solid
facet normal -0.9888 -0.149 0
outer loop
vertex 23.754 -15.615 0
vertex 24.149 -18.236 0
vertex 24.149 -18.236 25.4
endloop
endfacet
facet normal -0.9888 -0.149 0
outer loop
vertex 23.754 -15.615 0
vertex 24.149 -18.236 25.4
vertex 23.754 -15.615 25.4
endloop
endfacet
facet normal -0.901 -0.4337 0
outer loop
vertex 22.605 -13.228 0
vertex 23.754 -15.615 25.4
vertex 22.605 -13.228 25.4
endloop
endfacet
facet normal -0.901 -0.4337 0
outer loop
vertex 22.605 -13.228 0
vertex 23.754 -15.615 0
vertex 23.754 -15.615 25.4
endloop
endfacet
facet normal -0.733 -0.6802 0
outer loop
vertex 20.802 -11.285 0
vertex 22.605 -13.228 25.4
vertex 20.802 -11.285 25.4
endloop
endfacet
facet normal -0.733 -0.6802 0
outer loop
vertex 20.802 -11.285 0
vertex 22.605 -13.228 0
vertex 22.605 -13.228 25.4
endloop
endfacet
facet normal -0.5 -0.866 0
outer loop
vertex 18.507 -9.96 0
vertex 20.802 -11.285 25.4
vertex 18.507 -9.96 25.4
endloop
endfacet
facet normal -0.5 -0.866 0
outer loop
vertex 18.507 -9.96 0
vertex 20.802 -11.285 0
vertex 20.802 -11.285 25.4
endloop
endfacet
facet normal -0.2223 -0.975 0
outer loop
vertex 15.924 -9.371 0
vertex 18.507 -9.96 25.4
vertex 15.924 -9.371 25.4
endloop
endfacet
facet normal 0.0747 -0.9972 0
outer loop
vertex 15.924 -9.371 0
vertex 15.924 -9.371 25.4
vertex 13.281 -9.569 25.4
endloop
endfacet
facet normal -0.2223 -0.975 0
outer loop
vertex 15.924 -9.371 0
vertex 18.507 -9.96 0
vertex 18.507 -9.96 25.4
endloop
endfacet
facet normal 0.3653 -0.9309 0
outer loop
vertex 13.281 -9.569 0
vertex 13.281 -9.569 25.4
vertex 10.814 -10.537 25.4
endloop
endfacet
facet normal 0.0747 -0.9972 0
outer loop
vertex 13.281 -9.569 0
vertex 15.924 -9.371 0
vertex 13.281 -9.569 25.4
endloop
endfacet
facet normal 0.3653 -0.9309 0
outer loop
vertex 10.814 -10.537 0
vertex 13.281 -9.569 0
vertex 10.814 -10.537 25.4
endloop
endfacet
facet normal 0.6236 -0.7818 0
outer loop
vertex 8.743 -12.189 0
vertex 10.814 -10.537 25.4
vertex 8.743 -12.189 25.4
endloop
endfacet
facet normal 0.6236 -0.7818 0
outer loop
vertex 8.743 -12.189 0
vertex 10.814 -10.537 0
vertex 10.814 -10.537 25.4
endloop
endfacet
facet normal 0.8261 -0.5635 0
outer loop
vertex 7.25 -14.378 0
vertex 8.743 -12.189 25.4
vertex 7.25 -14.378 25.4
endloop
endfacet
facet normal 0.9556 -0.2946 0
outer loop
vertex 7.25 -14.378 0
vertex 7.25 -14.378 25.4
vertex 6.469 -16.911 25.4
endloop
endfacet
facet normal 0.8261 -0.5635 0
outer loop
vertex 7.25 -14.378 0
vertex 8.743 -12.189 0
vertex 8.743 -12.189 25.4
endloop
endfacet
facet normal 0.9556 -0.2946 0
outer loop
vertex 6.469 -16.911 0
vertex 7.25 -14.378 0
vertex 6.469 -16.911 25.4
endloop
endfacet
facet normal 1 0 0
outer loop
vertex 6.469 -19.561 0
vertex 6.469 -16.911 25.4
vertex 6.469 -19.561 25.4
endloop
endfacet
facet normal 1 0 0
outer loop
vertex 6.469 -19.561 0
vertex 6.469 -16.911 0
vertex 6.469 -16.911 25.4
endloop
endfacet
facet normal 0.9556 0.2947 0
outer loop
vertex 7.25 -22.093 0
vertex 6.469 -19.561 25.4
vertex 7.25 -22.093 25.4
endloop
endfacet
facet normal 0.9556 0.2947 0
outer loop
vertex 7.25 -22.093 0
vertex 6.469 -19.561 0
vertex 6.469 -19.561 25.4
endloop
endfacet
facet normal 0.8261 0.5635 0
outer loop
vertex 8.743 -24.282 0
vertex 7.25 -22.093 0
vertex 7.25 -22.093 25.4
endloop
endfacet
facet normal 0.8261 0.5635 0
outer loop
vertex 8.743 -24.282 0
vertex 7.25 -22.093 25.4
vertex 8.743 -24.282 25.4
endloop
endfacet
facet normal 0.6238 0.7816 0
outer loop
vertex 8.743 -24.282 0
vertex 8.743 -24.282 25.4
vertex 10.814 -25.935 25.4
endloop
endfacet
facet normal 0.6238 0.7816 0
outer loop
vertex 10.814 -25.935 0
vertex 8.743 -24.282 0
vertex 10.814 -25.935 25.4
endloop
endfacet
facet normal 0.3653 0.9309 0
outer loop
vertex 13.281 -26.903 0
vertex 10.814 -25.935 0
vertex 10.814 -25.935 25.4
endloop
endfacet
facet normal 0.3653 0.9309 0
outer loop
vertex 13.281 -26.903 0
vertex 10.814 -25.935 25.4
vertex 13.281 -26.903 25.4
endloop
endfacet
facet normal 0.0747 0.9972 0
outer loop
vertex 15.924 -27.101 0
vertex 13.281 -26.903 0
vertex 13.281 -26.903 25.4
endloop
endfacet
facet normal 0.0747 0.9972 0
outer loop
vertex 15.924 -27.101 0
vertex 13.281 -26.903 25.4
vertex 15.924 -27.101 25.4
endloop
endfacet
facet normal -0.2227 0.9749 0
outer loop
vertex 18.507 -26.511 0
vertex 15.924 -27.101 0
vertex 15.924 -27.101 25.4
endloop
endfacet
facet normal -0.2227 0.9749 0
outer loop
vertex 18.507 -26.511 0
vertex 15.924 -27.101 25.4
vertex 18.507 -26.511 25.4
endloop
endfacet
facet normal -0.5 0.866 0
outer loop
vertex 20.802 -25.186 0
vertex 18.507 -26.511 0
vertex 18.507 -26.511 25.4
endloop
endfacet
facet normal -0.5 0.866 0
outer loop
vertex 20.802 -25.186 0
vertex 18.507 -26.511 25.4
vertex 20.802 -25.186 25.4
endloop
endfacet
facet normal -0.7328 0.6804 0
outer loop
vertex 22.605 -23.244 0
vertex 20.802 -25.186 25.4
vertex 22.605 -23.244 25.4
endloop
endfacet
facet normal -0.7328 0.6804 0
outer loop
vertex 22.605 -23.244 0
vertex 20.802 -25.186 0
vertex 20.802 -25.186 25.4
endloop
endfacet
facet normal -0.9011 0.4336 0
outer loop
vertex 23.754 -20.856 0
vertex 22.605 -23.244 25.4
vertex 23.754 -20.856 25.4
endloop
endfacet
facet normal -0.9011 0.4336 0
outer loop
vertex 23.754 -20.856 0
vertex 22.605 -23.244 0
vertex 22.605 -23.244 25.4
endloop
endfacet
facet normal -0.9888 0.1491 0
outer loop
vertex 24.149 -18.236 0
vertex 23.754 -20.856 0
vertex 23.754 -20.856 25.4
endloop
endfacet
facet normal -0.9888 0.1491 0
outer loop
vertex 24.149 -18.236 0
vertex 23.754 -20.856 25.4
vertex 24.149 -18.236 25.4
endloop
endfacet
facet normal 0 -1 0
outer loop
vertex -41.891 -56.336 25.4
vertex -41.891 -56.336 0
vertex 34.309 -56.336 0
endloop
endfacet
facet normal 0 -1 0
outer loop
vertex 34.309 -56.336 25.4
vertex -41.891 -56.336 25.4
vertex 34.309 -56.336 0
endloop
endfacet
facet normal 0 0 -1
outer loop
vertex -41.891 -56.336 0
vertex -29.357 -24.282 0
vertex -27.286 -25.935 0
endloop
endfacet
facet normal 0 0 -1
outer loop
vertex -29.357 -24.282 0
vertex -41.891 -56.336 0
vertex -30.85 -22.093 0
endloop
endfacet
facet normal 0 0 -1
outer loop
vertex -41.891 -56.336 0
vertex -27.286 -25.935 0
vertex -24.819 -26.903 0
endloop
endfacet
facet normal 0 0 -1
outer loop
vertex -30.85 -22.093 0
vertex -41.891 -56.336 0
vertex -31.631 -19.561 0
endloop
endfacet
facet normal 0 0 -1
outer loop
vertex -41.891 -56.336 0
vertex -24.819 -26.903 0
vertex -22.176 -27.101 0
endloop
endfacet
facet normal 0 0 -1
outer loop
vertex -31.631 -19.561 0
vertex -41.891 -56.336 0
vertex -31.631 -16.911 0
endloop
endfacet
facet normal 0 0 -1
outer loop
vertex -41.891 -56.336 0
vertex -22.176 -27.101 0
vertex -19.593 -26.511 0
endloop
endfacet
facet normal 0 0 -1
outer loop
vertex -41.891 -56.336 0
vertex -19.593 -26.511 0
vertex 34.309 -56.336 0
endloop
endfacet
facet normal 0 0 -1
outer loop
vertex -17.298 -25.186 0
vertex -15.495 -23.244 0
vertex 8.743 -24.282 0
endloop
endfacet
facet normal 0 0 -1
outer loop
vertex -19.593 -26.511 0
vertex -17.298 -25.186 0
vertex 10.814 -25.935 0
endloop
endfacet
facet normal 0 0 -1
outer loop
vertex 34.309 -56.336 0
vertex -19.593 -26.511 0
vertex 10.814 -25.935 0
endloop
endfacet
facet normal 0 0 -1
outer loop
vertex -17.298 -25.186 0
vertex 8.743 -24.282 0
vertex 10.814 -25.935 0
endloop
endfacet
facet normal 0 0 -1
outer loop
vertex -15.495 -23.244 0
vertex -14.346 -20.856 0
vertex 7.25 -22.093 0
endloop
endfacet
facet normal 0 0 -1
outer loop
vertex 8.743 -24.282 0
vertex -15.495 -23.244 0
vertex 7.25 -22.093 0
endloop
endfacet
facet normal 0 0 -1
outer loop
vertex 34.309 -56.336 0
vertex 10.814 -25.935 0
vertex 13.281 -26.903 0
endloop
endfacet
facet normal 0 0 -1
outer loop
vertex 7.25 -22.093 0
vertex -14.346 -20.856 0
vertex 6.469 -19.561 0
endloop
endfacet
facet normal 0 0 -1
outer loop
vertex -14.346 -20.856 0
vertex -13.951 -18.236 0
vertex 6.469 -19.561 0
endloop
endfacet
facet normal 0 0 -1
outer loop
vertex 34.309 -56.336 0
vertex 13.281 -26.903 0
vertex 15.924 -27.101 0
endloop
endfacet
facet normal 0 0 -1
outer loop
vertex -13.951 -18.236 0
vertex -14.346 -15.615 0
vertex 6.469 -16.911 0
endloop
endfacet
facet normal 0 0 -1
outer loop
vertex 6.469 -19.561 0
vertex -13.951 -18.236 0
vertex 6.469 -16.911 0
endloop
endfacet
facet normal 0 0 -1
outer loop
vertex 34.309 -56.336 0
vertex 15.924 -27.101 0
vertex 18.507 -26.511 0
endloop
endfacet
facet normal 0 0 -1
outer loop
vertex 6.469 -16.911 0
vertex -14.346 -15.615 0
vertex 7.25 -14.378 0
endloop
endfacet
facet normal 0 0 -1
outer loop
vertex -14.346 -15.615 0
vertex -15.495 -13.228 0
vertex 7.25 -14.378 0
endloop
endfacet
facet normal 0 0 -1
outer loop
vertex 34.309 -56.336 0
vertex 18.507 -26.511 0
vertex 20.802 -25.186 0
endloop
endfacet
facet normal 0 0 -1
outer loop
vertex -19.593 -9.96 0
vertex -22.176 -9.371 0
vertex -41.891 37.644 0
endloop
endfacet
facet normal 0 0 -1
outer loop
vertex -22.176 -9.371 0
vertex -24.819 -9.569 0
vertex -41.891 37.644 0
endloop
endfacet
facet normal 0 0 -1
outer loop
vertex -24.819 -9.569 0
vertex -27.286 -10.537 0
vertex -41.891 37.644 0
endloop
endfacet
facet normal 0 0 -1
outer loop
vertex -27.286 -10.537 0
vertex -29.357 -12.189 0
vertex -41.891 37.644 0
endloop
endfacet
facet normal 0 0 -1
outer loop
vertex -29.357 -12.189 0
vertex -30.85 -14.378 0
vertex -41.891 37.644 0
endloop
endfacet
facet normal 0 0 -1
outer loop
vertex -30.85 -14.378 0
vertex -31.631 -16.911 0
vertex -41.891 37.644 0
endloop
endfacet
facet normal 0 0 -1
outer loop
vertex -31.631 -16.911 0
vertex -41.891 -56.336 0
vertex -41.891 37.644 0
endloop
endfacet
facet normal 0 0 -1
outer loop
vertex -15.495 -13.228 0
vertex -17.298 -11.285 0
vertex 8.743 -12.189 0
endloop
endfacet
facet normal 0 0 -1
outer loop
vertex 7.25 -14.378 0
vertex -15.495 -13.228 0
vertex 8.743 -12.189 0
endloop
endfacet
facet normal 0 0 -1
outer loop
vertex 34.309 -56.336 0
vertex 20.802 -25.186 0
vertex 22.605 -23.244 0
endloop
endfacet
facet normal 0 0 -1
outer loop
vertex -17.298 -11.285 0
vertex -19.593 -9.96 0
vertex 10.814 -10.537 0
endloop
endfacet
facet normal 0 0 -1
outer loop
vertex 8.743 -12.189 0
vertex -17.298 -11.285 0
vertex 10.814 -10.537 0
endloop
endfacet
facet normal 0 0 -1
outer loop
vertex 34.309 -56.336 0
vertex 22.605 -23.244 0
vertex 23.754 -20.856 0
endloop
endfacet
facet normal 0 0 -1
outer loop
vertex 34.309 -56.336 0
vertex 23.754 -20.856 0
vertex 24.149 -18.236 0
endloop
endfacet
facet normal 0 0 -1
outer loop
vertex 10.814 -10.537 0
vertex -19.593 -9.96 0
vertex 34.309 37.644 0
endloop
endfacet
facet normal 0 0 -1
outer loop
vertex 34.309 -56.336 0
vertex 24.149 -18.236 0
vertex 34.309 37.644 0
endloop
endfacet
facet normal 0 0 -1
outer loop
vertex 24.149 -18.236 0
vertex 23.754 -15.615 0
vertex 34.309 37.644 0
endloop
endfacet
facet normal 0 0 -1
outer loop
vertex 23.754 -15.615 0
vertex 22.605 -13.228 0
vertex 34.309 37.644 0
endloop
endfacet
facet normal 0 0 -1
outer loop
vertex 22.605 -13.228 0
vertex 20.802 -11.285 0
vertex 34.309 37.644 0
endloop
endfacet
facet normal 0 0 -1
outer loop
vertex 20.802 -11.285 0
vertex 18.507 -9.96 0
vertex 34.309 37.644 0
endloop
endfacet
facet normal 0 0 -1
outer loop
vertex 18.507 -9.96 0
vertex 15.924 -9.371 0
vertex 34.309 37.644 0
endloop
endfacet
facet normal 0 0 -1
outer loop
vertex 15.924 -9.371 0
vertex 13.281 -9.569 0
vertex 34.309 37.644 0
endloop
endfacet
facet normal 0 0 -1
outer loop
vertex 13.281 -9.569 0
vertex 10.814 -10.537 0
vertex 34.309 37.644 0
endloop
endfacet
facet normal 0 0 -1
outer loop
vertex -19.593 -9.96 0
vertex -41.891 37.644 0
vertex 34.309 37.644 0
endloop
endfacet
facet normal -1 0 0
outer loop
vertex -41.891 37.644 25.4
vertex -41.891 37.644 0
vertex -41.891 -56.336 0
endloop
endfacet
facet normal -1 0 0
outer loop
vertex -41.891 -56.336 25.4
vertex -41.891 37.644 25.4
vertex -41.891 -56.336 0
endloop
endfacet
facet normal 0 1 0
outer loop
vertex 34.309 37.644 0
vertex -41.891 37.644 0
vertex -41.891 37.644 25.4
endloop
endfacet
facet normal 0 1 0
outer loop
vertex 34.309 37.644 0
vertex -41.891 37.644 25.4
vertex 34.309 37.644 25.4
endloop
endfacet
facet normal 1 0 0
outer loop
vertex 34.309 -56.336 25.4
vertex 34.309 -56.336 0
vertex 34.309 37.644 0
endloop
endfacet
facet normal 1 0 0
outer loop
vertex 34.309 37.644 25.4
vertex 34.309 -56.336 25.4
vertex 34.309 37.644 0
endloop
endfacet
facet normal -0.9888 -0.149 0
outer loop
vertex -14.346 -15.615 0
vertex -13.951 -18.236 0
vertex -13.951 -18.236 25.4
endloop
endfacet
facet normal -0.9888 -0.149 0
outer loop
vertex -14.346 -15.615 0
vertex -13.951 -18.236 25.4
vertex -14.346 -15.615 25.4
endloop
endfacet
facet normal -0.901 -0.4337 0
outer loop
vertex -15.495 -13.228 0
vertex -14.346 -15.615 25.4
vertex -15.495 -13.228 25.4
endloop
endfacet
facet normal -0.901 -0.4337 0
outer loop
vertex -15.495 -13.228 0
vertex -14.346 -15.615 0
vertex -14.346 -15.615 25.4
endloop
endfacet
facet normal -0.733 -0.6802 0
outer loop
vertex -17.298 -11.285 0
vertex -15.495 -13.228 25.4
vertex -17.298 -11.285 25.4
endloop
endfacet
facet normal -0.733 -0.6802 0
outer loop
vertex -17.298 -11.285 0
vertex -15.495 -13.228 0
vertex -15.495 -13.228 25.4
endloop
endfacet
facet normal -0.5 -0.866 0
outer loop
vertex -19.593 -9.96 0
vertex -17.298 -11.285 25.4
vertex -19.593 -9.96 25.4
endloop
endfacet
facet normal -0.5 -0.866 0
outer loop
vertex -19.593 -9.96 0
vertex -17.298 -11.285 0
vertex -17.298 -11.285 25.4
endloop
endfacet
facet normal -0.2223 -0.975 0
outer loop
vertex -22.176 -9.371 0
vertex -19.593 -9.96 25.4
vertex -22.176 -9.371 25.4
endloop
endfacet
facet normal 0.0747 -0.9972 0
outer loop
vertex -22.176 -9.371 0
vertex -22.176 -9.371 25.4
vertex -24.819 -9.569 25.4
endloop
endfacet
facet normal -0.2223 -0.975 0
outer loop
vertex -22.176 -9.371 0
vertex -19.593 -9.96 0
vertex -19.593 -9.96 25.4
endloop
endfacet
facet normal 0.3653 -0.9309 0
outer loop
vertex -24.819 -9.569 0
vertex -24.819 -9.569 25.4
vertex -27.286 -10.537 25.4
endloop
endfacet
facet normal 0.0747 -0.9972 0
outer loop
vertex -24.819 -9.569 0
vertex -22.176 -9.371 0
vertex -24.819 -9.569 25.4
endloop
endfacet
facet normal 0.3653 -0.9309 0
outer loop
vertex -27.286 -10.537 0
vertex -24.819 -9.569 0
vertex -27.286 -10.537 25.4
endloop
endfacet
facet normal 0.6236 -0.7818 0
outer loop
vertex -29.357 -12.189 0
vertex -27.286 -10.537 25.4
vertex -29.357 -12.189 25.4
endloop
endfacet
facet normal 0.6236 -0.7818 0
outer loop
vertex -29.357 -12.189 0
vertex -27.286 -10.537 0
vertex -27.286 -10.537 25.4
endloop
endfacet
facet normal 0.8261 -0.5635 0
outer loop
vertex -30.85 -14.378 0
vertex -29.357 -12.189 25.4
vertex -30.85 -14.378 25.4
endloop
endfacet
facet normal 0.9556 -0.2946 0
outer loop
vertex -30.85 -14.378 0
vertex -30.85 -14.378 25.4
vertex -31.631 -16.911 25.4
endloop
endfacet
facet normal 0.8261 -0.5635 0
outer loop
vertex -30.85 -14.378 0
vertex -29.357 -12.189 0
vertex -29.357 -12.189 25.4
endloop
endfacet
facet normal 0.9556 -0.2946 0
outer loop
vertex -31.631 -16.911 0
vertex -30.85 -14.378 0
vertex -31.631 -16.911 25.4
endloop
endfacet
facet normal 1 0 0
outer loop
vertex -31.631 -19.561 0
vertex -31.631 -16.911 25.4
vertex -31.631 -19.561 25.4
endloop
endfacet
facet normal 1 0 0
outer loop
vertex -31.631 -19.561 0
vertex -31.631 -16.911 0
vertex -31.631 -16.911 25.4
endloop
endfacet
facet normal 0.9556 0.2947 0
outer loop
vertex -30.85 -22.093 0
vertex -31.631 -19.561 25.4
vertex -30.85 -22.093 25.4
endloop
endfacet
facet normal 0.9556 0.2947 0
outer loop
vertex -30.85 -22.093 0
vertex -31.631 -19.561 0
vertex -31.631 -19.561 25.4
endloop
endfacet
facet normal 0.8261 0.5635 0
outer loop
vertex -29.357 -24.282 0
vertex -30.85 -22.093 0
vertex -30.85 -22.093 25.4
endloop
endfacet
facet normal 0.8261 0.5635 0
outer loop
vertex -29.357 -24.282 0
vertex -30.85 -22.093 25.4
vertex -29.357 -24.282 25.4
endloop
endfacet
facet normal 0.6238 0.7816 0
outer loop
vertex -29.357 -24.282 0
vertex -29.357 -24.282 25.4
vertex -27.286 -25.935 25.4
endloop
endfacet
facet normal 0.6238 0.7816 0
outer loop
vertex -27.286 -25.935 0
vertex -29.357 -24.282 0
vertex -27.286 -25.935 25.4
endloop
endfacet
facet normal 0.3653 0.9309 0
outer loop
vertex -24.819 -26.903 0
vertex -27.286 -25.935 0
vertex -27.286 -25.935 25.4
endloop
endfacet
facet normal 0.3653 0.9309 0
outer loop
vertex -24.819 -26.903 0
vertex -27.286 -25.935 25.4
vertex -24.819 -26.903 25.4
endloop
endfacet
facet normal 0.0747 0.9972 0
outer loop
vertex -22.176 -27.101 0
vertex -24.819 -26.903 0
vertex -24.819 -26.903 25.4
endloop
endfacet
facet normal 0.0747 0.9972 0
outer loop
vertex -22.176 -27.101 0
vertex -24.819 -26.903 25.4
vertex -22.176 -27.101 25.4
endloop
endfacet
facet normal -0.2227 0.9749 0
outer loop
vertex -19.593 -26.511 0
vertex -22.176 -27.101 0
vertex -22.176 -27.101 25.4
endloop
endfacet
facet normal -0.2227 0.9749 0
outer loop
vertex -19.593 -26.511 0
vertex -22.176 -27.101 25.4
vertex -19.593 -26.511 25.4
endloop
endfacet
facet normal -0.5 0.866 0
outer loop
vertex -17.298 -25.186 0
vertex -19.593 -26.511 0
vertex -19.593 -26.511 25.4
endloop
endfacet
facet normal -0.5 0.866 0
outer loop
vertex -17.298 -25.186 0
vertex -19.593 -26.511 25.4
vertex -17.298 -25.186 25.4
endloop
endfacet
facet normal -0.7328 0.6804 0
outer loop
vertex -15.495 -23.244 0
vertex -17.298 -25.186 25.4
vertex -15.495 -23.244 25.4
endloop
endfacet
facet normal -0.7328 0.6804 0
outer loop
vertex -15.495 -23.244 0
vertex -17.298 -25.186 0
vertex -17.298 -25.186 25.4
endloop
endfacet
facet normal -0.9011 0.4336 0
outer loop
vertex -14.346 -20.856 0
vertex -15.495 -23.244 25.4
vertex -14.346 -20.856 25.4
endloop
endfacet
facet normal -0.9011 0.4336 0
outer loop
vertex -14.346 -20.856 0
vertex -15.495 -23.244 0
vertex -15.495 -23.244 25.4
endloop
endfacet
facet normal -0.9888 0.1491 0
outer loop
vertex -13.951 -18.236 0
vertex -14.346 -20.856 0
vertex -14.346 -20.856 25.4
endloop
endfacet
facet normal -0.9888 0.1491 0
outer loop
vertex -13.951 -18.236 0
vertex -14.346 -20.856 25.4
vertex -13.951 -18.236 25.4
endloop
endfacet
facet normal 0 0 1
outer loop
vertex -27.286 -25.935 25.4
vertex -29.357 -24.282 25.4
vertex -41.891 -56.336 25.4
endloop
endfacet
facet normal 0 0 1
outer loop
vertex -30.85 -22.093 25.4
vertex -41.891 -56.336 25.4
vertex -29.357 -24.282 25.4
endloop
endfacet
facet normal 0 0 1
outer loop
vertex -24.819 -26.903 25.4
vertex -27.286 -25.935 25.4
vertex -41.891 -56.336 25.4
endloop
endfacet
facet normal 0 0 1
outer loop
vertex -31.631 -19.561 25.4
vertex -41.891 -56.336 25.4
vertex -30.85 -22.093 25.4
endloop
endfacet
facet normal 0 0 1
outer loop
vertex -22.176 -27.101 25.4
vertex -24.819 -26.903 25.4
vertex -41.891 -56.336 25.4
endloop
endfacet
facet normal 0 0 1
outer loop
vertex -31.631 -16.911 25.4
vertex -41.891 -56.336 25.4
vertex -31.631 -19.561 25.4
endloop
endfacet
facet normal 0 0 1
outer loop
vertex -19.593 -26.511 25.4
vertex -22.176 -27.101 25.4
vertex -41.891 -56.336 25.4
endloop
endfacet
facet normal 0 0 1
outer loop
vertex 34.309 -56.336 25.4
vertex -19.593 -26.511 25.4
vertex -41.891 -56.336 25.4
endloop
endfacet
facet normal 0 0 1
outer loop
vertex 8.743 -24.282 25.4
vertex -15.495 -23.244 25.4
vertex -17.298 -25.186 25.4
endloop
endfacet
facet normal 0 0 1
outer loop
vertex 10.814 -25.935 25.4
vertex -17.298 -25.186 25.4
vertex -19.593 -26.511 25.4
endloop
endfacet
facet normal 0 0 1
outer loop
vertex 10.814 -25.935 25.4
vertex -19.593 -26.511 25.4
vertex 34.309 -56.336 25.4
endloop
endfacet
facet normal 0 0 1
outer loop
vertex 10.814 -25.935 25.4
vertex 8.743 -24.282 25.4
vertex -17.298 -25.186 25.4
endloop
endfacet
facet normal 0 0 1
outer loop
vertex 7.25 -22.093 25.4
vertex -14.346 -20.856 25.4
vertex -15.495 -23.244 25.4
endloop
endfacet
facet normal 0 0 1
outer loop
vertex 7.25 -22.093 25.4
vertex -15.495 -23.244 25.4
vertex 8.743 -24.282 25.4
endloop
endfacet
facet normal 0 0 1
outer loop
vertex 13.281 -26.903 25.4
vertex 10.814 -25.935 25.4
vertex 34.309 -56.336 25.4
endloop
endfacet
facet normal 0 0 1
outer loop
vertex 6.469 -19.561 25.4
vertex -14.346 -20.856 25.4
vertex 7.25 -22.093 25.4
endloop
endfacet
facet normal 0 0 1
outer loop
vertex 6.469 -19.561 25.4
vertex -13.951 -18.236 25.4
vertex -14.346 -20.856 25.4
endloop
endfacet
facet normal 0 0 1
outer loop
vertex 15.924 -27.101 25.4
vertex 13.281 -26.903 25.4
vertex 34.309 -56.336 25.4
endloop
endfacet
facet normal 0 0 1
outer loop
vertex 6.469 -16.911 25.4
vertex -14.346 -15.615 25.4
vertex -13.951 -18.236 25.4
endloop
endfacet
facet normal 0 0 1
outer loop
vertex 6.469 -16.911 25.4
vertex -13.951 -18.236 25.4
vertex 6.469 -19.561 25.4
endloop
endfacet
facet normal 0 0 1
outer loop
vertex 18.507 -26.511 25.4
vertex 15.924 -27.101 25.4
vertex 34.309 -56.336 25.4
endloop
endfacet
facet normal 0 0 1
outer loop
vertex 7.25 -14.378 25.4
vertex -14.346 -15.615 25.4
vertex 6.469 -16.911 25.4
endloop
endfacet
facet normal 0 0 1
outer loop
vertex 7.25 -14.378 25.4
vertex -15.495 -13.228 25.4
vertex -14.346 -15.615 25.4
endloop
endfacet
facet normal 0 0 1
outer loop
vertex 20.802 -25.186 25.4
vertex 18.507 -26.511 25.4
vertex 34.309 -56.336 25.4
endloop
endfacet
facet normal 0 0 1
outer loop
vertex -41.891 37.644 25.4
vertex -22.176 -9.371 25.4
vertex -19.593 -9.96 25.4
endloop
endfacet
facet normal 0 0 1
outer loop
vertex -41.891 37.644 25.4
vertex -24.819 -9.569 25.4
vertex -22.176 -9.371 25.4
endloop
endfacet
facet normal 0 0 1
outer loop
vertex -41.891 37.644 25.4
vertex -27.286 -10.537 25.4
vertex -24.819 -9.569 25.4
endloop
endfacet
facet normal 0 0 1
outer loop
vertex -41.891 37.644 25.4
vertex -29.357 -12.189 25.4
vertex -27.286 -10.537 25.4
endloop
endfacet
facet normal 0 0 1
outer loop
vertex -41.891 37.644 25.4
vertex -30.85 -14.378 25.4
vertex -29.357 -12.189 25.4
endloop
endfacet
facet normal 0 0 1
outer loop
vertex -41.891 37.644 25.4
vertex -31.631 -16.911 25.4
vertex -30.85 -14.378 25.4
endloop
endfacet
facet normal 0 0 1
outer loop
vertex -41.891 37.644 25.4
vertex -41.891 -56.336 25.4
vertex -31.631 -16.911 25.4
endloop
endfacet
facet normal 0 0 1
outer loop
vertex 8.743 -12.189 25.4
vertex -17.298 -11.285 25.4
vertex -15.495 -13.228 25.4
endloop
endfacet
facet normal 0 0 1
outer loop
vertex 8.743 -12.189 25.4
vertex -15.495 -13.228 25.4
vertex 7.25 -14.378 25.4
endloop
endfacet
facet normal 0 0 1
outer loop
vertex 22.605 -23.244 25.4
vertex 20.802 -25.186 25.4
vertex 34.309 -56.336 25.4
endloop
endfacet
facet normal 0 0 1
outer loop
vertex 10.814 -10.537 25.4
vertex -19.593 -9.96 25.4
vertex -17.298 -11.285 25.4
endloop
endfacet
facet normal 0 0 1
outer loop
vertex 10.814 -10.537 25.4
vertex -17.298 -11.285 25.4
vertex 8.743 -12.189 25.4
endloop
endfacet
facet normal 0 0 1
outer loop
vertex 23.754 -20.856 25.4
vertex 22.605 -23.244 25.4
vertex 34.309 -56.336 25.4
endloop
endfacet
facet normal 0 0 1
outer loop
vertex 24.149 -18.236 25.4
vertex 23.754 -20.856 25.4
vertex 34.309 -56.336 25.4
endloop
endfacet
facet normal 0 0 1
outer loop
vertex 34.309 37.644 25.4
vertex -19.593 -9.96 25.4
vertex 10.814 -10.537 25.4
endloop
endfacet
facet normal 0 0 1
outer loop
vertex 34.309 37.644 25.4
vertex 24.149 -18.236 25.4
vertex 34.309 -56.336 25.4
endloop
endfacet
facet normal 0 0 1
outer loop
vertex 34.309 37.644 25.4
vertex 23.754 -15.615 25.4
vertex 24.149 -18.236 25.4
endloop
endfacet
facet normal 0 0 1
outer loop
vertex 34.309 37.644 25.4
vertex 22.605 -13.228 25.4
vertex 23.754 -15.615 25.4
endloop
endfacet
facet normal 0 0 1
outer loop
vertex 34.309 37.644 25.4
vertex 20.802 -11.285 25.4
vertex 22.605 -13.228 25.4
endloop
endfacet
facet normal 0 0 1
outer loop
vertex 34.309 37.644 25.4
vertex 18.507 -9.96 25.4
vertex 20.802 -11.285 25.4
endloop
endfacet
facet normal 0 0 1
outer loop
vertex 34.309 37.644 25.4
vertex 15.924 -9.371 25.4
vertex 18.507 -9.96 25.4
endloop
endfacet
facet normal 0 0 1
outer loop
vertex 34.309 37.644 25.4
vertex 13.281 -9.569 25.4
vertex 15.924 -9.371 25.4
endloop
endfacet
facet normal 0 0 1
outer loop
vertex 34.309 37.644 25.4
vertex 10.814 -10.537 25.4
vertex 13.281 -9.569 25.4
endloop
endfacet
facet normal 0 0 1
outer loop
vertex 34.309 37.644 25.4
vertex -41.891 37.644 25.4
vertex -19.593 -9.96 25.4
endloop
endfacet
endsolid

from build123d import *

# Parameters (mm, degrees)
F0_W     = 76.2
F0_H     = 76.2
F0_R     = 8.89
F0_H_2   = 17.78
F1_DEPTH = 25.4


with BuildPart() as f1:
    # F0 (on Top) → F1 (new body)
    with BuildSketch(Plane.XY):
        with Locations((-3.790651, -18.235706)):
            Rectangle(F0_W, F0_H)
        with Locations((-22.840651, -18.235706)):
            Circle(F0_R, mode=Mode.SUBTRACT)
        with Locations((15.259349, -18.235706)):
            Circle(F0_R, mode=Mode.SUBTRACT)
        with Locations((-3.790651, 28.754294)):
            Rectangle(F0_W, F0_H_2)
    extrude(amount=F1_DEPTH)


solid = f1.part
